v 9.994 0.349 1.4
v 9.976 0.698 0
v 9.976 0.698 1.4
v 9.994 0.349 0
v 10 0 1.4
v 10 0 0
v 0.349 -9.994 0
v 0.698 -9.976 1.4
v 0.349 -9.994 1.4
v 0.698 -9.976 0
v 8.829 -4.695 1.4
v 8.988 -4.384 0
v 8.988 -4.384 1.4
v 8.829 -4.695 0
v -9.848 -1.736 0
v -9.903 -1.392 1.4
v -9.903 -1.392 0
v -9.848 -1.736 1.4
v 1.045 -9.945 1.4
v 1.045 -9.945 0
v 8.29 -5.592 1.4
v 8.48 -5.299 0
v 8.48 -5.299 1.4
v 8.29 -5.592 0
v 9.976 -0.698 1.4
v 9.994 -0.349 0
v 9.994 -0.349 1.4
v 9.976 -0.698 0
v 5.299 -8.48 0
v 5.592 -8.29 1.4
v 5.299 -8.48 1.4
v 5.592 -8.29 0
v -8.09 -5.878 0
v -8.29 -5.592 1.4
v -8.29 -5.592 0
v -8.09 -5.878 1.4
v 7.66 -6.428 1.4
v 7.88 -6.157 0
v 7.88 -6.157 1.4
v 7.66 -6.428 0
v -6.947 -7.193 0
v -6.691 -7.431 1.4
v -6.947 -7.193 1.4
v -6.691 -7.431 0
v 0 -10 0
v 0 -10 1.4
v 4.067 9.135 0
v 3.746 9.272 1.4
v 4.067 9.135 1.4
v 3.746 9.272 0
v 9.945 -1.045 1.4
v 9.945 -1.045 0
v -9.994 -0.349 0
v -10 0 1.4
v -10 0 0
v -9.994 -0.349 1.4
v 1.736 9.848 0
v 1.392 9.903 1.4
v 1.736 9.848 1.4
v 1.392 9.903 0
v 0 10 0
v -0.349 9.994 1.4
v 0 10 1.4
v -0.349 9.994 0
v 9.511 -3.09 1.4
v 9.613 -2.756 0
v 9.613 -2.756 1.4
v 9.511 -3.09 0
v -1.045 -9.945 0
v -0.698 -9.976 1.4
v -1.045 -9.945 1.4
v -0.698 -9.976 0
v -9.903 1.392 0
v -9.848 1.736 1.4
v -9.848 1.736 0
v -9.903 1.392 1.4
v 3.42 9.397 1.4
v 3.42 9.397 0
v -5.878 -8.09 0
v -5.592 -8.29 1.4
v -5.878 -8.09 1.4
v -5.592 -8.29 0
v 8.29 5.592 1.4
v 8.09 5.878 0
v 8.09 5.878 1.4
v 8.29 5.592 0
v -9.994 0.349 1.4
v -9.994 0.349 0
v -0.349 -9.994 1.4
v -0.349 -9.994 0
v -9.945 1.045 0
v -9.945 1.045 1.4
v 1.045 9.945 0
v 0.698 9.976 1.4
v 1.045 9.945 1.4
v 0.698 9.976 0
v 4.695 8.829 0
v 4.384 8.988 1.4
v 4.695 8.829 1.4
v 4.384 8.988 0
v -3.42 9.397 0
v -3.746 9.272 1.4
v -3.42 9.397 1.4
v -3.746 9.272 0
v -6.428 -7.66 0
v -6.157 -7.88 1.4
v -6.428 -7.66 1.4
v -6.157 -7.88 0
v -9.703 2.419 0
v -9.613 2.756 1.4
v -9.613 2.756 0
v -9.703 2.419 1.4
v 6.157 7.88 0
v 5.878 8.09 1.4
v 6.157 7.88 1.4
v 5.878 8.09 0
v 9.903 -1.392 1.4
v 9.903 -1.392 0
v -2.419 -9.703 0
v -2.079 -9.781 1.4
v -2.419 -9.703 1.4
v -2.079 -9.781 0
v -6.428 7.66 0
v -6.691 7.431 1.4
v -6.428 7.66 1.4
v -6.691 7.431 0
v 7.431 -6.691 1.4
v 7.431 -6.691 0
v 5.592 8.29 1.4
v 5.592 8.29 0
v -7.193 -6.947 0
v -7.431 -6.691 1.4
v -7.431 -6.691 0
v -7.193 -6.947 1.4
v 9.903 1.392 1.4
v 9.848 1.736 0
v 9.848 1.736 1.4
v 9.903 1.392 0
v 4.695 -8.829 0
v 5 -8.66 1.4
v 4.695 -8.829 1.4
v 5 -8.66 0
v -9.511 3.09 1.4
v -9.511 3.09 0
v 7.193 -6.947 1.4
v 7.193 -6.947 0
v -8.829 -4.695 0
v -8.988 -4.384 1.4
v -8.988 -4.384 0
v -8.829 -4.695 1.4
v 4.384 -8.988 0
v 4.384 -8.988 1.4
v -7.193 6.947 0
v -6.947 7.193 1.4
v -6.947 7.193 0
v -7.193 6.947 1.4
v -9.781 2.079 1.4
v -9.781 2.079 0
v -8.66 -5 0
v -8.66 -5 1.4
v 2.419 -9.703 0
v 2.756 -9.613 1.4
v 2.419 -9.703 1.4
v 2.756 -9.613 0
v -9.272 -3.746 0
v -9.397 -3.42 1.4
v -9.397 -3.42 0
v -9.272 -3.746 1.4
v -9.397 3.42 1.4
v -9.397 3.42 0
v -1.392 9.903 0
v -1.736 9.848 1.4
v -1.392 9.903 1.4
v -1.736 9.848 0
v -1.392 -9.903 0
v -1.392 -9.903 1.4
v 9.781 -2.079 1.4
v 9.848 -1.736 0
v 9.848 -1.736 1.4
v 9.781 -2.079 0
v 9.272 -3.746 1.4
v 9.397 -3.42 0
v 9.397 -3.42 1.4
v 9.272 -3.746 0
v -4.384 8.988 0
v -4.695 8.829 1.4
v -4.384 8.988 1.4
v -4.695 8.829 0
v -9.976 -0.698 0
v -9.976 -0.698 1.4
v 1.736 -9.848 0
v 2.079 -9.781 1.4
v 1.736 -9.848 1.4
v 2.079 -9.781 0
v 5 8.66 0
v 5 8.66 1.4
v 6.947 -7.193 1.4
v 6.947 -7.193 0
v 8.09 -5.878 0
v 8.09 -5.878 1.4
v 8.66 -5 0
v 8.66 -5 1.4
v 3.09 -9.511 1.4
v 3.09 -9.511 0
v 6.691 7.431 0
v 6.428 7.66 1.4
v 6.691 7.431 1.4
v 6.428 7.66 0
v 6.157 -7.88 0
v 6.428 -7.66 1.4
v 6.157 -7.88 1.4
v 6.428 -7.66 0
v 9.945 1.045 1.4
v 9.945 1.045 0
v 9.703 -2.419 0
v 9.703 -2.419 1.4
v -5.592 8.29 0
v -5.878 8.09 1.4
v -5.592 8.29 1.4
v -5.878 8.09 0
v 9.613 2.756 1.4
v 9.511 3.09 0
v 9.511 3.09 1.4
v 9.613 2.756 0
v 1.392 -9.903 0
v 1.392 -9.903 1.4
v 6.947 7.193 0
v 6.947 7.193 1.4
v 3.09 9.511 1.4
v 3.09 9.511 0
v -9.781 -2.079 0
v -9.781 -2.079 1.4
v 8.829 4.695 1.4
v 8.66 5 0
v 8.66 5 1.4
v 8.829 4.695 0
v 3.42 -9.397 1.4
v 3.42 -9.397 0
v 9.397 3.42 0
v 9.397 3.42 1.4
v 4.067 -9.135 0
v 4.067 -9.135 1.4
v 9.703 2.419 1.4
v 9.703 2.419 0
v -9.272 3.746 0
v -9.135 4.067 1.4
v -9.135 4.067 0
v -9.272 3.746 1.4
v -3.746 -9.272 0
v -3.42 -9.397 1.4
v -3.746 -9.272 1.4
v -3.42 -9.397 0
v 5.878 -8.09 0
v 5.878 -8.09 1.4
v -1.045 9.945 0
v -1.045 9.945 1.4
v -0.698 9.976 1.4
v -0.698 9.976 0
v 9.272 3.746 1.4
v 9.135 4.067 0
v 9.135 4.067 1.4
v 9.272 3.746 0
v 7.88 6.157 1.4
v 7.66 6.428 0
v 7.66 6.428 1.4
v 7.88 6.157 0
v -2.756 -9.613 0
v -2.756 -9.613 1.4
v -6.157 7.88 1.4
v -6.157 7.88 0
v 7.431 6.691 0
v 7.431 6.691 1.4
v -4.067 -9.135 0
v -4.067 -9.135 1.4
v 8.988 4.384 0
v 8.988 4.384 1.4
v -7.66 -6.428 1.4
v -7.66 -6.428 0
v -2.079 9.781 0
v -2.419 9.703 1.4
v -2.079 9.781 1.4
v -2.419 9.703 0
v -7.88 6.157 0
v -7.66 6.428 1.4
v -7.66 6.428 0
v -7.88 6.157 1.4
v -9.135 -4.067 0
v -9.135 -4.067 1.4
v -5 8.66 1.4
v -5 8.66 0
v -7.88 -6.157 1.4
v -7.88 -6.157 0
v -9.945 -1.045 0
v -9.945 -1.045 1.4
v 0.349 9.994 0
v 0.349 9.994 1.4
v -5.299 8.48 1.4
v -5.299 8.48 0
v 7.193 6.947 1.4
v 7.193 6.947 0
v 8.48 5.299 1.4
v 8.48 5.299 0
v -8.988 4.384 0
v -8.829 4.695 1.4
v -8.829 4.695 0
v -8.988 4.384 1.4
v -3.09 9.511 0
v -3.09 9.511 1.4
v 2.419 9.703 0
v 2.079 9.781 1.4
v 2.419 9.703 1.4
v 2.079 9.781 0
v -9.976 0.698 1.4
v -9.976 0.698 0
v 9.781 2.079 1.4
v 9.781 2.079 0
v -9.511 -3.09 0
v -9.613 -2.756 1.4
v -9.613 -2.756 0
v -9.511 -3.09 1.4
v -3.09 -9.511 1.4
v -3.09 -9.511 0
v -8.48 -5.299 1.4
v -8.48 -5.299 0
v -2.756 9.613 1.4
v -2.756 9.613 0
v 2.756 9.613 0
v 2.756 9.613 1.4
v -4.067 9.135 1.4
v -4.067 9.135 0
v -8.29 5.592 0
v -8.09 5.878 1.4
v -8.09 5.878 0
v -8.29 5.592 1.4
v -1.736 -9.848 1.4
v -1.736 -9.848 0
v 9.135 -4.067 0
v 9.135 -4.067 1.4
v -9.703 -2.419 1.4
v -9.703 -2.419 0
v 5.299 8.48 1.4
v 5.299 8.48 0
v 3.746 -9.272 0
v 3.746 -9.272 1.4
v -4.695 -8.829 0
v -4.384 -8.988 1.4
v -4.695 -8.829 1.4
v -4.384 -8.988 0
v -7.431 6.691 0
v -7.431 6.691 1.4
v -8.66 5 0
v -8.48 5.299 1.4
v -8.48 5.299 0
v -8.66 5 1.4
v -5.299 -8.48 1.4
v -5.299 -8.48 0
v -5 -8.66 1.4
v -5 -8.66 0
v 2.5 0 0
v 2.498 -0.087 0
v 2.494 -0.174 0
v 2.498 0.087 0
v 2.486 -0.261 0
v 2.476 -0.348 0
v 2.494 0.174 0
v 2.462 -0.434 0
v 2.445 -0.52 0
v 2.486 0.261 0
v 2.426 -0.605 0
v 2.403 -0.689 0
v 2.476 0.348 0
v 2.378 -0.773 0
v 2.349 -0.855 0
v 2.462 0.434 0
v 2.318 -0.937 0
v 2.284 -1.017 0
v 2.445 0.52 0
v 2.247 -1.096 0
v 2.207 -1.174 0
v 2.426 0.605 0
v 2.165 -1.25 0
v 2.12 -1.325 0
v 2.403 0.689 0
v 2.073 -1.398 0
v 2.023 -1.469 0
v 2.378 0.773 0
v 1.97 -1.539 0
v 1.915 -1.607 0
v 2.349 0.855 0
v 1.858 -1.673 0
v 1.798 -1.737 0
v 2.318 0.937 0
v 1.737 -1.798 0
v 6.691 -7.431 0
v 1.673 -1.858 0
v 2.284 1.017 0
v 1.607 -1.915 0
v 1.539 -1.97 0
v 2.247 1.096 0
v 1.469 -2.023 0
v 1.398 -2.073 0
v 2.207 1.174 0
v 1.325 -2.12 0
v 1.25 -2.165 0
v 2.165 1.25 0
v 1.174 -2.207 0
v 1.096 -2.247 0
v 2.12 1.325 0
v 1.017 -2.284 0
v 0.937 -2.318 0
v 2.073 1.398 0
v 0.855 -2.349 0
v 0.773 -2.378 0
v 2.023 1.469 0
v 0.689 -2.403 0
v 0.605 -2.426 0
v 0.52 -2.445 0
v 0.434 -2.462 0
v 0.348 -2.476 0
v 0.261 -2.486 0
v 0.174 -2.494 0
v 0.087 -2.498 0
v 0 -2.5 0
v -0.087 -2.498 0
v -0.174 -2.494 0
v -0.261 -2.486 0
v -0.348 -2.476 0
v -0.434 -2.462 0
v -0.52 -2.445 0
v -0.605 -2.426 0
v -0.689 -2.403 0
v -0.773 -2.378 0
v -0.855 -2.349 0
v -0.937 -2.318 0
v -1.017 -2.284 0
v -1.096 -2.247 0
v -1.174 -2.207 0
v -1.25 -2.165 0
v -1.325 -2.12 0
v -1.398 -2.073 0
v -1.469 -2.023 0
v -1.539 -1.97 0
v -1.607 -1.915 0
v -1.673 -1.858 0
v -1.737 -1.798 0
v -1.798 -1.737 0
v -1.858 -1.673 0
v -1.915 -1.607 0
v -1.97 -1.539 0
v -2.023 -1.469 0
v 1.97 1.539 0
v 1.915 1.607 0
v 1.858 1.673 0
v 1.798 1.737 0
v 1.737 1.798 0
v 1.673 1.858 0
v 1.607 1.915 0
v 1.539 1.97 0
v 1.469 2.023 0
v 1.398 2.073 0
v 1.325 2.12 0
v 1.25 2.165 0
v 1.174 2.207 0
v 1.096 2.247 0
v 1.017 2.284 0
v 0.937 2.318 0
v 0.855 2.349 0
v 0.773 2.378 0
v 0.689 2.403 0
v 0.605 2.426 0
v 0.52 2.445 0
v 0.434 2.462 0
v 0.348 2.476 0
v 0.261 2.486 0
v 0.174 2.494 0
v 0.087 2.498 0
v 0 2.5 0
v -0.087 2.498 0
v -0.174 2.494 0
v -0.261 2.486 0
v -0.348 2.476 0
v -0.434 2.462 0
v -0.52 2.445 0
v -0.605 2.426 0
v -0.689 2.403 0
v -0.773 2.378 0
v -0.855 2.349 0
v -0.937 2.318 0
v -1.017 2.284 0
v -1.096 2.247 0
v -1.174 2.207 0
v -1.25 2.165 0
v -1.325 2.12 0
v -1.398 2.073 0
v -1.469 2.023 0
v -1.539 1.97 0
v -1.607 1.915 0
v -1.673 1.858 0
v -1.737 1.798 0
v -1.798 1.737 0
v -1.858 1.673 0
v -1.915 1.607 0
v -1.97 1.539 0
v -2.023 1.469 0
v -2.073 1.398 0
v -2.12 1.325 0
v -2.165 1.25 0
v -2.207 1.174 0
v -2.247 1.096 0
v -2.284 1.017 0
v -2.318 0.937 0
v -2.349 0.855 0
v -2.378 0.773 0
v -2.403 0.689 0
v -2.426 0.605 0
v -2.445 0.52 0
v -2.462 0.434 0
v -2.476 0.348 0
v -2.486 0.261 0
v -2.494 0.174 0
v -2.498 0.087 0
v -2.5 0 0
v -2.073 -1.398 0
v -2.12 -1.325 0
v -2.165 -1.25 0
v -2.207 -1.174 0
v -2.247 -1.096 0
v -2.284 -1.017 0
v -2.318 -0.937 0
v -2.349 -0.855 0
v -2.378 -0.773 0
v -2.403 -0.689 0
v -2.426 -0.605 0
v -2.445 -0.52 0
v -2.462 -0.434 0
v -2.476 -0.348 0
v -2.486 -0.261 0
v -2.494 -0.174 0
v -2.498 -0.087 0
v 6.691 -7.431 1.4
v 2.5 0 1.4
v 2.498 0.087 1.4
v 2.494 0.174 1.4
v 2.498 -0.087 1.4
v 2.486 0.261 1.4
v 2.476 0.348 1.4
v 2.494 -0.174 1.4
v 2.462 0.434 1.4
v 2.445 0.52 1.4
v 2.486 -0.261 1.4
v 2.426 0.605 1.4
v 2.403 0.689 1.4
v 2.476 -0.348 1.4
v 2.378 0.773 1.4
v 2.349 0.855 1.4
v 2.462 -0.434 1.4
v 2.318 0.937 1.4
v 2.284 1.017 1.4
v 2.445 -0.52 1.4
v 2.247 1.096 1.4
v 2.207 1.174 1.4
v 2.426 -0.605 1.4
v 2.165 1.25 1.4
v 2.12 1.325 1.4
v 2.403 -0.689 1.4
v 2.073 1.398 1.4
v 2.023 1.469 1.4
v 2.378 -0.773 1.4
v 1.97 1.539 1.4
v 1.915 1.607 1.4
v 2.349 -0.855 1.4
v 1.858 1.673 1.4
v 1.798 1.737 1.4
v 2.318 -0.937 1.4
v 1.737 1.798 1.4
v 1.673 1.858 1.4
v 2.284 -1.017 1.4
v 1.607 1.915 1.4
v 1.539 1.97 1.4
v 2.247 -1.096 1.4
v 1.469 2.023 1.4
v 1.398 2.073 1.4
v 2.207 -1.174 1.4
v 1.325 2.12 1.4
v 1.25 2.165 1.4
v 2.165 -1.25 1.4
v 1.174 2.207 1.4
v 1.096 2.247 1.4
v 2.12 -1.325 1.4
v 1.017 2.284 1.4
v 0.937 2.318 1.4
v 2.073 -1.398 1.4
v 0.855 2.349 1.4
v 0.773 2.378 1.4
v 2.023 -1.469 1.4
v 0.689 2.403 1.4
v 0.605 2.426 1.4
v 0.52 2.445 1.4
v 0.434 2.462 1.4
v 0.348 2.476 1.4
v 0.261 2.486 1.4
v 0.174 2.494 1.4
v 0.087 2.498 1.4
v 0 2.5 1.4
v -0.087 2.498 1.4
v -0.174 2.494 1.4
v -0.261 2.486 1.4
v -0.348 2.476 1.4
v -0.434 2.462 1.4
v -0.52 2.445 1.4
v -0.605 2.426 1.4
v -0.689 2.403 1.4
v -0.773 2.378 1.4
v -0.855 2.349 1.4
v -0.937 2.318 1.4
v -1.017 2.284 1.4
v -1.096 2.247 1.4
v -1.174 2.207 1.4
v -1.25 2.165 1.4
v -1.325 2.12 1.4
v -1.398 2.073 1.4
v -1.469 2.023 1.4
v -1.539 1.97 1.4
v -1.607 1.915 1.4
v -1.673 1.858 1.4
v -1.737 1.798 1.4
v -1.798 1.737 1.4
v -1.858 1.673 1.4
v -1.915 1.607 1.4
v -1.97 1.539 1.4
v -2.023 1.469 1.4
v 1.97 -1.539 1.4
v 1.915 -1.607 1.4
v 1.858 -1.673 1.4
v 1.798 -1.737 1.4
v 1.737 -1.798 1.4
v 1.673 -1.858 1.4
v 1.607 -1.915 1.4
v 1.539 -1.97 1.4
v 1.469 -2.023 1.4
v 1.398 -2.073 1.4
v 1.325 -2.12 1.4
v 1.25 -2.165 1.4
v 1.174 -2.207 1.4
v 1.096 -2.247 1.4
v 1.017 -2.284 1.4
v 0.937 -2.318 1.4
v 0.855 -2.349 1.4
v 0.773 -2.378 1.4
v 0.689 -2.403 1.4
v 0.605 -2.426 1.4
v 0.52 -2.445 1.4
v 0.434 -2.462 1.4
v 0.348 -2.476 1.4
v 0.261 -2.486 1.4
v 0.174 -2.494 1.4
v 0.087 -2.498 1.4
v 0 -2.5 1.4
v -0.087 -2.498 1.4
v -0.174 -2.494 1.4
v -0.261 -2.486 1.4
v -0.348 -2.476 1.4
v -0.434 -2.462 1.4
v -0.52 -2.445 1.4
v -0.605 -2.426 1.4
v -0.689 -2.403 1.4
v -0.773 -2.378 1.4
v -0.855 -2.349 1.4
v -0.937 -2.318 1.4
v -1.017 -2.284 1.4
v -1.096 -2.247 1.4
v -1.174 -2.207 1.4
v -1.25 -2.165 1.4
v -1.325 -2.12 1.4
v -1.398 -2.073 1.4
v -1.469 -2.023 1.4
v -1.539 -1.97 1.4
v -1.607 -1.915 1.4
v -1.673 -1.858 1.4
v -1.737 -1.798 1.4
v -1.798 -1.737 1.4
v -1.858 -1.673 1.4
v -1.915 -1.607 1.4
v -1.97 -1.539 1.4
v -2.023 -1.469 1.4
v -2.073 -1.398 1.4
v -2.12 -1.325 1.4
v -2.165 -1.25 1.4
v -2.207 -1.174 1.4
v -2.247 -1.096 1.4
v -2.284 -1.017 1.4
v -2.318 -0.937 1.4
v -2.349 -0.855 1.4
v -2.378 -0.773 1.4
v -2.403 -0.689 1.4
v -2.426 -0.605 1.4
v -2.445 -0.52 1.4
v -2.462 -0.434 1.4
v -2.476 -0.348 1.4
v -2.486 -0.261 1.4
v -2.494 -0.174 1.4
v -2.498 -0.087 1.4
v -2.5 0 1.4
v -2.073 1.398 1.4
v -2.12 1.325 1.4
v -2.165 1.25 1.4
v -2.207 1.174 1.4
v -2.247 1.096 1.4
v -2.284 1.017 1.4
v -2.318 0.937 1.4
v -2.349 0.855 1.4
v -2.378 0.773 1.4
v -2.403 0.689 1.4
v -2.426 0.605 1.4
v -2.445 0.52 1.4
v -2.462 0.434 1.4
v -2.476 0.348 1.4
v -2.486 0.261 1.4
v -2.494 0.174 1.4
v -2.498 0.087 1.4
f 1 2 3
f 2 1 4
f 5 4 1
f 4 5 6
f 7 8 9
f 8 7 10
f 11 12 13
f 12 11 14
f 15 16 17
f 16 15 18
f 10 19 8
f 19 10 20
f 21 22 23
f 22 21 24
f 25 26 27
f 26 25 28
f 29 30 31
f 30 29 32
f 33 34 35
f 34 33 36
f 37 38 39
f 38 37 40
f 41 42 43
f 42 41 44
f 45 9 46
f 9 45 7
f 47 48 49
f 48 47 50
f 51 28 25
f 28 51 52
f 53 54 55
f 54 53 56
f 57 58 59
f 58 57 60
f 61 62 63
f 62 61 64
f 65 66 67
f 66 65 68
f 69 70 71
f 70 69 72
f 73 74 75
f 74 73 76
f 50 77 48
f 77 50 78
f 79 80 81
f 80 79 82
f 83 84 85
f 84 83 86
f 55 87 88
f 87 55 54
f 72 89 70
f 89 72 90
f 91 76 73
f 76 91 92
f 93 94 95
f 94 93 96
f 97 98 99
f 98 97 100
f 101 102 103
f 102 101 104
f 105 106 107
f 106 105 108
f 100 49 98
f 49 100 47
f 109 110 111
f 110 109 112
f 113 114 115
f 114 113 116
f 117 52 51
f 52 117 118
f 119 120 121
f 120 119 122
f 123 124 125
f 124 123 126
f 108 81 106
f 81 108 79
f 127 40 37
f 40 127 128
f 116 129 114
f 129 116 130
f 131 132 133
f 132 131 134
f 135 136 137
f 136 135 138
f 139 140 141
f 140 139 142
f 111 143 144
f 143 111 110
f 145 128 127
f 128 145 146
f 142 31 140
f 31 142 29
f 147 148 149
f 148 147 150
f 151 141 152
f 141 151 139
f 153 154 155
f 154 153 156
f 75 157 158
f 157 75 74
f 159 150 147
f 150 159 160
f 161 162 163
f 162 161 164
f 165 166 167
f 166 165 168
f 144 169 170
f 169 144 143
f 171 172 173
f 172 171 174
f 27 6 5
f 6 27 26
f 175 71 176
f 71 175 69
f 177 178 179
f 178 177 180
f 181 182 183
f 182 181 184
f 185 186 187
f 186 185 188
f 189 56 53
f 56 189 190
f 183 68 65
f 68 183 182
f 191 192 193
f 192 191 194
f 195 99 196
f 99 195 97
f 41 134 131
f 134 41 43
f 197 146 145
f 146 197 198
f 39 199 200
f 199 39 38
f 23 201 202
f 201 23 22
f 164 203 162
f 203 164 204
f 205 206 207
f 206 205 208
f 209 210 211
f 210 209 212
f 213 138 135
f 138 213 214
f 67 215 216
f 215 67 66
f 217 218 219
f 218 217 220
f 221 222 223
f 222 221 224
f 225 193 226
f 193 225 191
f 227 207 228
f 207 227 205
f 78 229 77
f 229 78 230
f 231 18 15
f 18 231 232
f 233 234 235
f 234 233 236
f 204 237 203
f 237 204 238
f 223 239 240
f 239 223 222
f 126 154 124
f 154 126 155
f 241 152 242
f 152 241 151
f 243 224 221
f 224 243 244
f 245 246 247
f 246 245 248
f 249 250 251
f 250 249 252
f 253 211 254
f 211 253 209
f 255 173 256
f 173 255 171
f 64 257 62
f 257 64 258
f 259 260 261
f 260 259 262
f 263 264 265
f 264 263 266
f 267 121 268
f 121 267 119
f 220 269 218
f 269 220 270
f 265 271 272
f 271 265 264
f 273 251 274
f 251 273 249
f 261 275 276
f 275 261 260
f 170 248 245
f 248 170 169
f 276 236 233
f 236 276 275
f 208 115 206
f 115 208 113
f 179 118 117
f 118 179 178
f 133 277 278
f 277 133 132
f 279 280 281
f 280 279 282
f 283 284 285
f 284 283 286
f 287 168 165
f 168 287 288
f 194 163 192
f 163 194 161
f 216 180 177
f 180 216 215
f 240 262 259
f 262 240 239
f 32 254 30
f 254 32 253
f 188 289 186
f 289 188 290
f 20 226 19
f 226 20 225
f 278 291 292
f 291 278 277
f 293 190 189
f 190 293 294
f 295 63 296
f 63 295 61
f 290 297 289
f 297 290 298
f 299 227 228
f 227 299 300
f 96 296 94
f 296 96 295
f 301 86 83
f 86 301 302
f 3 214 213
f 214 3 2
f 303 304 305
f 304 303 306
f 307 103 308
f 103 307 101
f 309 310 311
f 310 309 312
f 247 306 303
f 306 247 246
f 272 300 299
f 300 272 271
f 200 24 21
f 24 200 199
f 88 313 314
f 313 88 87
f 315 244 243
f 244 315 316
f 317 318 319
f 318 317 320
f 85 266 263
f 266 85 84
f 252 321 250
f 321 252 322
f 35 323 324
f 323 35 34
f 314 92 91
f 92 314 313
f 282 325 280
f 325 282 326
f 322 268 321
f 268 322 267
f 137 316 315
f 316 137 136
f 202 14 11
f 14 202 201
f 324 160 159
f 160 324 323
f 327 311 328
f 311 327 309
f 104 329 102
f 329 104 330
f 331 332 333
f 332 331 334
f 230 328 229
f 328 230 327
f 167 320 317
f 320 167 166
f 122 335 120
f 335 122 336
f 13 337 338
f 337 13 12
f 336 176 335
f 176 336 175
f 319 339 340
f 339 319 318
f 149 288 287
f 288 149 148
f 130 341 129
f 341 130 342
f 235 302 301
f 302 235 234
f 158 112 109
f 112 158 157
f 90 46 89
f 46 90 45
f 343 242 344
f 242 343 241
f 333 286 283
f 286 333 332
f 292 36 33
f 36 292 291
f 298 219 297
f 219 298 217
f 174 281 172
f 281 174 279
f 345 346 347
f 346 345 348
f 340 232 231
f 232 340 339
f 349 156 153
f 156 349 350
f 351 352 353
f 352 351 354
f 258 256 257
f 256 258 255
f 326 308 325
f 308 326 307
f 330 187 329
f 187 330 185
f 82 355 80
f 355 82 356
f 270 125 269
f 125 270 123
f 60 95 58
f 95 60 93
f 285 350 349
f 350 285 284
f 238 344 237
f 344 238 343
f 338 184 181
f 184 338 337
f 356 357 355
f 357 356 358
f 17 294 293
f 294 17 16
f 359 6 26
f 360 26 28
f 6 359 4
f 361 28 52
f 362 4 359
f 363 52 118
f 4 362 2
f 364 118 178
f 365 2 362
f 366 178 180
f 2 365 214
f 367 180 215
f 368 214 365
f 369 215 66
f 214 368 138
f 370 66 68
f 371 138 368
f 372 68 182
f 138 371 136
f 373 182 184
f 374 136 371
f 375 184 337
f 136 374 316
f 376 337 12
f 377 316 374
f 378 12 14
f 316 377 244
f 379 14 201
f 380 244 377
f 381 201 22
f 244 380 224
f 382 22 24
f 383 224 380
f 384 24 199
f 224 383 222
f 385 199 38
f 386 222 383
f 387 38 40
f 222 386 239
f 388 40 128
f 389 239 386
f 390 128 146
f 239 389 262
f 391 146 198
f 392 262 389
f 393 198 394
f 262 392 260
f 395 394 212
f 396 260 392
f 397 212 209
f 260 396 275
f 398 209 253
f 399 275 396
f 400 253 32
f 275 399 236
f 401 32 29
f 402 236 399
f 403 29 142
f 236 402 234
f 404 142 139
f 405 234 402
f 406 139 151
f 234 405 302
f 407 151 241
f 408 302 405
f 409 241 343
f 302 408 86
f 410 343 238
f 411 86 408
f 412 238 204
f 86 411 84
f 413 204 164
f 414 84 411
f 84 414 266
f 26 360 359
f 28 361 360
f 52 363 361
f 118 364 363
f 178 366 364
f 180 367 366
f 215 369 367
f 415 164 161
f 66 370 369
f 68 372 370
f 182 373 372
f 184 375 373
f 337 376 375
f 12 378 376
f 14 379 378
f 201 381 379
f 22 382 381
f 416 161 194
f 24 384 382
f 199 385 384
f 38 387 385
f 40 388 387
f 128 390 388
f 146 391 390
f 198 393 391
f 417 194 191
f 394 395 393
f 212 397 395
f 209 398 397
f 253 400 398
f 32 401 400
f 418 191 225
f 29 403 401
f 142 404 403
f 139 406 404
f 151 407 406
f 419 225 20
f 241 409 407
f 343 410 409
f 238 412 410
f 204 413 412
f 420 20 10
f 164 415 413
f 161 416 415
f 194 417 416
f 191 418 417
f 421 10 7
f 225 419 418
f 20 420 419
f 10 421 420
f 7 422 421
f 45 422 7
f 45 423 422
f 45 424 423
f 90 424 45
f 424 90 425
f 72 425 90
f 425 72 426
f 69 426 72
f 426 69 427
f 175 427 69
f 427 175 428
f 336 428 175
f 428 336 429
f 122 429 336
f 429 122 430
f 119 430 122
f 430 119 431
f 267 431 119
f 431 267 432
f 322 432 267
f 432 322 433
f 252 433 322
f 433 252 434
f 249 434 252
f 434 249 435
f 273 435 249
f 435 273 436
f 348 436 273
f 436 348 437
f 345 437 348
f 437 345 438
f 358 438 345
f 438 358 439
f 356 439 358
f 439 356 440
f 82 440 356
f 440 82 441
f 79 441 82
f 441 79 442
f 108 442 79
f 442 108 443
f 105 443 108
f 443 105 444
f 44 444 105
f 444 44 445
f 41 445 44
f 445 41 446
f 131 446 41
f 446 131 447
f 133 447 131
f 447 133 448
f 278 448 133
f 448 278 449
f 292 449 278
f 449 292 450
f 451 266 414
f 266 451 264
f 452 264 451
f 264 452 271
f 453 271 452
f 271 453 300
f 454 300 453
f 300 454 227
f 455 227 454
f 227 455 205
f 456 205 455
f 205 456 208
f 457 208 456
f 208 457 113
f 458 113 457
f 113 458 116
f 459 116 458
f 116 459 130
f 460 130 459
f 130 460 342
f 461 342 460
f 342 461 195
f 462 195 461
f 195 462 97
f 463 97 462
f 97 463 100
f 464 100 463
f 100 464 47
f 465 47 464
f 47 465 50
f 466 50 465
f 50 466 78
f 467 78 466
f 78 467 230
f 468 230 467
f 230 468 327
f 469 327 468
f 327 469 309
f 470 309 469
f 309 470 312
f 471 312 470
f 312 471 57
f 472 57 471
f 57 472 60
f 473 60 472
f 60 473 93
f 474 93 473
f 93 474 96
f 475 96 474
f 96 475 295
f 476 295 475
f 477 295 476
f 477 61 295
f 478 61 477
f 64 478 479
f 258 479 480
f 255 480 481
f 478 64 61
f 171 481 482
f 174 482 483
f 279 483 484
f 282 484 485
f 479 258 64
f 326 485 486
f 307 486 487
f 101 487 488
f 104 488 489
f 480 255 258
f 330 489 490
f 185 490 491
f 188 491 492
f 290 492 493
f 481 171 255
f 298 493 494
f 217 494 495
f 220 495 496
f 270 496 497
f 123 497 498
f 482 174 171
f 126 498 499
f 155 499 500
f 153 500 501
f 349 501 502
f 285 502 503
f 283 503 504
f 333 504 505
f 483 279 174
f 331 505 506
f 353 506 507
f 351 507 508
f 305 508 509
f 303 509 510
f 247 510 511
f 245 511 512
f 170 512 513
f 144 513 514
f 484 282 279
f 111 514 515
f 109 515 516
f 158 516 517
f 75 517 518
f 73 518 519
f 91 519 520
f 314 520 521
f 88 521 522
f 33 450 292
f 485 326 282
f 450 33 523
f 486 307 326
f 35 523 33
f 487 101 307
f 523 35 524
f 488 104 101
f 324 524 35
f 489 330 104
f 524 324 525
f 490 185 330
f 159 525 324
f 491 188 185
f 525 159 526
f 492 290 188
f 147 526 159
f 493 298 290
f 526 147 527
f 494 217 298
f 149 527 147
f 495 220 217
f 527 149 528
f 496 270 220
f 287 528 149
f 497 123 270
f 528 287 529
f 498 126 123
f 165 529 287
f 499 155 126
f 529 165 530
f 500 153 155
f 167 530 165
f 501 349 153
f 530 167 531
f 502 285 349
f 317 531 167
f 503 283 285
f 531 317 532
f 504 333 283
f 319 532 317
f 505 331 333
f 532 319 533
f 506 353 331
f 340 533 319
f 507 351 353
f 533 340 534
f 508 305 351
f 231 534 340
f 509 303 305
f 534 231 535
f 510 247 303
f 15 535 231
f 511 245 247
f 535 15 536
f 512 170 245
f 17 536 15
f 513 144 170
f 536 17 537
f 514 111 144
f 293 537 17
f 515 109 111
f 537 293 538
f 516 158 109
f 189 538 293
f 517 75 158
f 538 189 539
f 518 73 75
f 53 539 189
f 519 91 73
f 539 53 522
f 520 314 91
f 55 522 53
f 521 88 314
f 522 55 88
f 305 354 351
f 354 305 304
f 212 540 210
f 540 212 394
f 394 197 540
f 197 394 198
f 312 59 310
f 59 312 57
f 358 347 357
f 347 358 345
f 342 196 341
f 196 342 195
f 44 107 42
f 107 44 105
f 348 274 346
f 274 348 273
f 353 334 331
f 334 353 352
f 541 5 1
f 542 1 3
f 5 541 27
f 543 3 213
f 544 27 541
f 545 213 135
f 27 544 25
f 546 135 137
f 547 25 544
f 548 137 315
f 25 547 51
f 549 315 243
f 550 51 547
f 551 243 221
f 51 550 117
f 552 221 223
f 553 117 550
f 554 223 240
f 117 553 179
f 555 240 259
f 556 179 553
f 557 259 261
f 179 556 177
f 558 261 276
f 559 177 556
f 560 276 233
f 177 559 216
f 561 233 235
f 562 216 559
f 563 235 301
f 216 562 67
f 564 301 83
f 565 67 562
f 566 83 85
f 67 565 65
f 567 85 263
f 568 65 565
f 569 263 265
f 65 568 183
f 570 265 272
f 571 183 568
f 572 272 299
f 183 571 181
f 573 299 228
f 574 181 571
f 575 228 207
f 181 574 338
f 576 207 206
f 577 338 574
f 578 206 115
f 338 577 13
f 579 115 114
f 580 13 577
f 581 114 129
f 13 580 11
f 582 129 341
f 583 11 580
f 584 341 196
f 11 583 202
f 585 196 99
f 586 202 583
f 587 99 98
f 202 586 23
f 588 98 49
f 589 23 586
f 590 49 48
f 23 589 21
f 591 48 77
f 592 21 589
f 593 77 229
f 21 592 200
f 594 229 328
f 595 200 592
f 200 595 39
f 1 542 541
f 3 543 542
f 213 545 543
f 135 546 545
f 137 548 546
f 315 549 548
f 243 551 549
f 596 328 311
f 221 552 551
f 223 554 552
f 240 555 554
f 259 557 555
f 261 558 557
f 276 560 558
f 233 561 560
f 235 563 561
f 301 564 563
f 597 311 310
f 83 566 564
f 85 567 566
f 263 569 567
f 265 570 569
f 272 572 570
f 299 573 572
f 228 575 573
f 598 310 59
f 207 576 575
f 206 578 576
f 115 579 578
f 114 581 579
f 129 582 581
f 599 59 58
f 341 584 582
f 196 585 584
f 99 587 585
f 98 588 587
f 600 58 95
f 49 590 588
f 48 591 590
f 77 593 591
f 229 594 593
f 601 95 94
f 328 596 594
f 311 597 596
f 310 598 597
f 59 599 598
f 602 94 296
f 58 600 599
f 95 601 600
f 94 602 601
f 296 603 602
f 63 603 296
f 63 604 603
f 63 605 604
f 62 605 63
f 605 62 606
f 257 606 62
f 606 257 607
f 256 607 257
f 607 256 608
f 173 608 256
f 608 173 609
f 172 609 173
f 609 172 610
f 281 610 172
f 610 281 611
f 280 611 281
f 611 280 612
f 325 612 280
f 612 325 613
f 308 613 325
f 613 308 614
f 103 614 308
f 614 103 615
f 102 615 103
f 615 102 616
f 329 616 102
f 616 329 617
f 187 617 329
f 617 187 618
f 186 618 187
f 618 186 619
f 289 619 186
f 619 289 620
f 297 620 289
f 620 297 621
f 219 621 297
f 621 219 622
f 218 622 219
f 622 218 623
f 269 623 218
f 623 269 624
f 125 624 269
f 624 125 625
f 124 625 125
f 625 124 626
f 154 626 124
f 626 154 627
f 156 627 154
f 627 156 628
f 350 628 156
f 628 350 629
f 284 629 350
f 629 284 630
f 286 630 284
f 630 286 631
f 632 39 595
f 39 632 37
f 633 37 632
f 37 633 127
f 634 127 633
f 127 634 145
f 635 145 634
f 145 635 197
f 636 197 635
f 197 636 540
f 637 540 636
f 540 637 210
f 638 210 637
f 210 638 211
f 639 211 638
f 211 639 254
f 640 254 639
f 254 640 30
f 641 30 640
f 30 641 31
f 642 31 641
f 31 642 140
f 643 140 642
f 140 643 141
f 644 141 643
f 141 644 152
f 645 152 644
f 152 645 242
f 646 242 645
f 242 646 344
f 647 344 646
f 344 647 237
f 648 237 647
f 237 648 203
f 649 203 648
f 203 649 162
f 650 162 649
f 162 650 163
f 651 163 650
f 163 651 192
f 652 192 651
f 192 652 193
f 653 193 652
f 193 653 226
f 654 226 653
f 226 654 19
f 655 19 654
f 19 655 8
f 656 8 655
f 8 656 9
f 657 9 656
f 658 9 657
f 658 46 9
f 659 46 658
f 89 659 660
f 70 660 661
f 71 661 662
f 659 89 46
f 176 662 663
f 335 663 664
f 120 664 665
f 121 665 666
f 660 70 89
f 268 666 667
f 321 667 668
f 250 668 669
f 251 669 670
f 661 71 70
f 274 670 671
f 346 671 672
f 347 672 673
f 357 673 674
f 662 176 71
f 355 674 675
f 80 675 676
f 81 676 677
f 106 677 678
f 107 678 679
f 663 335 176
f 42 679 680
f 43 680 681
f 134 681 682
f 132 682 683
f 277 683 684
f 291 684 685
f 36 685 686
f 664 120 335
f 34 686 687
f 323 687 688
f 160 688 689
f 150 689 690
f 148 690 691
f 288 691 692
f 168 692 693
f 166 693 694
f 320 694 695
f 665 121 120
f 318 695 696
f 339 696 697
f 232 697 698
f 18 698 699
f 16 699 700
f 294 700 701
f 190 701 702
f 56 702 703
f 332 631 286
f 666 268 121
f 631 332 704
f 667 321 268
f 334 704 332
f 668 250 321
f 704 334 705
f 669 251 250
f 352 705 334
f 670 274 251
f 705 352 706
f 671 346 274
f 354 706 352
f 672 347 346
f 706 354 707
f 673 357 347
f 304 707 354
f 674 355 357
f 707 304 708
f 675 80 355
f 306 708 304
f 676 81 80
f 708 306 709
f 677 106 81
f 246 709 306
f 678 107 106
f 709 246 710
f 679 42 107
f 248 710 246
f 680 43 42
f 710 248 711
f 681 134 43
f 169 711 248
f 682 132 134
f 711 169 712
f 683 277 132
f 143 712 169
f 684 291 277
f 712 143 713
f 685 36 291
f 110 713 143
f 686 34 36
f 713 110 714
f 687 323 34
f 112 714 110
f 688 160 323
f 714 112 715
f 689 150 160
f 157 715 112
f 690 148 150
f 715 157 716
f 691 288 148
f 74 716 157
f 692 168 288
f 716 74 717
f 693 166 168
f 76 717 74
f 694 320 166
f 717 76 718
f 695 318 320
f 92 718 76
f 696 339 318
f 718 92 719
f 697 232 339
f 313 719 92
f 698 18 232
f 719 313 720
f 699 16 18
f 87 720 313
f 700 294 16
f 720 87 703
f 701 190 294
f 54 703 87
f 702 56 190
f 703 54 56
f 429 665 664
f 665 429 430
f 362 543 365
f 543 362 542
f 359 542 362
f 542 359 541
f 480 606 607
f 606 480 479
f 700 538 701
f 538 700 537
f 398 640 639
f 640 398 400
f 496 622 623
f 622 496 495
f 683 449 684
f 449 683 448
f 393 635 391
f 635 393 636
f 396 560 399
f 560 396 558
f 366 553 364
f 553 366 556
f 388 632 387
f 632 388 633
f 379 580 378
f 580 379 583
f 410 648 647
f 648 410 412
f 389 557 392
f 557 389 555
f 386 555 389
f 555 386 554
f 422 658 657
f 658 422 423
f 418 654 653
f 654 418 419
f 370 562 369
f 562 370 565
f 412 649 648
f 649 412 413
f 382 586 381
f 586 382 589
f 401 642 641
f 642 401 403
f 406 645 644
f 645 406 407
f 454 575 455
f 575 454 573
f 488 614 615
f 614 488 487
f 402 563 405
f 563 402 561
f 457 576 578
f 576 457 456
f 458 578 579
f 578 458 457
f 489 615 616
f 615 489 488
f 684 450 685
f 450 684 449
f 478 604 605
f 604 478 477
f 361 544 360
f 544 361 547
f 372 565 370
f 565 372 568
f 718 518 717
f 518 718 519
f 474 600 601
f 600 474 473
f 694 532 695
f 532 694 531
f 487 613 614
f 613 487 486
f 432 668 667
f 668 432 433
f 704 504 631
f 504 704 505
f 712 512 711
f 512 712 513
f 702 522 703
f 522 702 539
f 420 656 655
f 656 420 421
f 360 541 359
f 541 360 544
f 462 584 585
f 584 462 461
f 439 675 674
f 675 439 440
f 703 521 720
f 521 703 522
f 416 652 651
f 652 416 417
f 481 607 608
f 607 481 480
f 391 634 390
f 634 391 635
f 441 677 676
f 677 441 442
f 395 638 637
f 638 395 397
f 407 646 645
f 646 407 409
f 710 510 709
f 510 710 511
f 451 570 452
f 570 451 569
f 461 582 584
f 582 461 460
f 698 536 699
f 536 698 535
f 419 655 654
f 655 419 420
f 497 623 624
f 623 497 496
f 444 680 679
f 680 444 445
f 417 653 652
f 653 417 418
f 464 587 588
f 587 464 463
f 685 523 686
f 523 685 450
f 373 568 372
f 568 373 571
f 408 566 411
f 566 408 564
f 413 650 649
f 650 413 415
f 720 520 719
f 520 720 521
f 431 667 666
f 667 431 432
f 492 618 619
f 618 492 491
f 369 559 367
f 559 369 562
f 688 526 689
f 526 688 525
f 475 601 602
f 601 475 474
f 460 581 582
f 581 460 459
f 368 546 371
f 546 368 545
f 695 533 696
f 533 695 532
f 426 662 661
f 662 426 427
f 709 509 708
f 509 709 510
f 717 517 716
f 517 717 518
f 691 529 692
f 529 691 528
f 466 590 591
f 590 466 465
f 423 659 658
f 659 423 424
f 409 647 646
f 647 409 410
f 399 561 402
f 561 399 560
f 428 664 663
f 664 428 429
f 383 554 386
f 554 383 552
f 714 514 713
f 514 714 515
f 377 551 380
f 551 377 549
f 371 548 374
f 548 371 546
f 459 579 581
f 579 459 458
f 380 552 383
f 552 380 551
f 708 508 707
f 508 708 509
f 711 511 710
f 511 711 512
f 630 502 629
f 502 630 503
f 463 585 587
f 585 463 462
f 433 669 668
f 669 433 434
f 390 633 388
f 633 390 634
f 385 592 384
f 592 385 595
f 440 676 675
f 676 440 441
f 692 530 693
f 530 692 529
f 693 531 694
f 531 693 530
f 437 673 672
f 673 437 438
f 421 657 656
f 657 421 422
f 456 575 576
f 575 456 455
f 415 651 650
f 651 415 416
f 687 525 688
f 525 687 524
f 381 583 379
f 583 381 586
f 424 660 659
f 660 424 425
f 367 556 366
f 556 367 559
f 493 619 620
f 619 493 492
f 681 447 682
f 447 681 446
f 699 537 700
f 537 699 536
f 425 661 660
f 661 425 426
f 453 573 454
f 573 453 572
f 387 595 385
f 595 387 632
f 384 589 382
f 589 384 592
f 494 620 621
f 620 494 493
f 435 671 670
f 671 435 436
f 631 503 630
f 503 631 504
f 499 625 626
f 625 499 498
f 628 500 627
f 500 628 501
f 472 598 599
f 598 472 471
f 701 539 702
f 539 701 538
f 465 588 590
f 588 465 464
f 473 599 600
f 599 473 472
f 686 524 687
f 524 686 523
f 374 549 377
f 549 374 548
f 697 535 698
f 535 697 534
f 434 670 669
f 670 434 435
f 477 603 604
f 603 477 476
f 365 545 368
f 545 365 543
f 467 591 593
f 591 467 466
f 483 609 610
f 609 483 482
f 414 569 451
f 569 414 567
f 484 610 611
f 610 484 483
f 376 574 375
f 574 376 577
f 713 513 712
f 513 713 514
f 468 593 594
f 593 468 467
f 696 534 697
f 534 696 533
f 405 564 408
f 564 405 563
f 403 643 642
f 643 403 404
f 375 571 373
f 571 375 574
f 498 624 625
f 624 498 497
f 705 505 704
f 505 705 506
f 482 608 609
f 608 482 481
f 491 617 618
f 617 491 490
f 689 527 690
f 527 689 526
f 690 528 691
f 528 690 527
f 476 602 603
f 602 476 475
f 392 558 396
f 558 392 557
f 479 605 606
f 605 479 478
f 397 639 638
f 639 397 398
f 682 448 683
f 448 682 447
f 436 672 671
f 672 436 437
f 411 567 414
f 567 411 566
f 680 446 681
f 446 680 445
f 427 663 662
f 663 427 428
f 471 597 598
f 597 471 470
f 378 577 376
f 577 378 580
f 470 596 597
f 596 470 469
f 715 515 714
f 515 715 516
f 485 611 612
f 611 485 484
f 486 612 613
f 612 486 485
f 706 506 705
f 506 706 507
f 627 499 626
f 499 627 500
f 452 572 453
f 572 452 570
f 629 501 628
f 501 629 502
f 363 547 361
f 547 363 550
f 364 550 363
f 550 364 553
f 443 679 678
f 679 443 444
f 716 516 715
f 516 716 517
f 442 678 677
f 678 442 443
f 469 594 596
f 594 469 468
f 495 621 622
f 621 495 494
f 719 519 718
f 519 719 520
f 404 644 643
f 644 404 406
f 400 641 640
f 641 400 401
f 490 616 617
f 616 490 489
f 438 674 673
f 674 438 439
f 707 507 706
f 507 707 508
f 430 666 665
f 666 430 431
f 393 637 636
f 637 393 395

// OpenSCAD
$fn = 180;

inner_d = 5.0;
outer_d = 20.0;
thickness = 1.4;

difference() {
  cylinder(d = outer_d, h = thickness);
  translate([0, 0, -0.1])
    cylinder(d = inner_d, h = thickness + 0.2);
}
